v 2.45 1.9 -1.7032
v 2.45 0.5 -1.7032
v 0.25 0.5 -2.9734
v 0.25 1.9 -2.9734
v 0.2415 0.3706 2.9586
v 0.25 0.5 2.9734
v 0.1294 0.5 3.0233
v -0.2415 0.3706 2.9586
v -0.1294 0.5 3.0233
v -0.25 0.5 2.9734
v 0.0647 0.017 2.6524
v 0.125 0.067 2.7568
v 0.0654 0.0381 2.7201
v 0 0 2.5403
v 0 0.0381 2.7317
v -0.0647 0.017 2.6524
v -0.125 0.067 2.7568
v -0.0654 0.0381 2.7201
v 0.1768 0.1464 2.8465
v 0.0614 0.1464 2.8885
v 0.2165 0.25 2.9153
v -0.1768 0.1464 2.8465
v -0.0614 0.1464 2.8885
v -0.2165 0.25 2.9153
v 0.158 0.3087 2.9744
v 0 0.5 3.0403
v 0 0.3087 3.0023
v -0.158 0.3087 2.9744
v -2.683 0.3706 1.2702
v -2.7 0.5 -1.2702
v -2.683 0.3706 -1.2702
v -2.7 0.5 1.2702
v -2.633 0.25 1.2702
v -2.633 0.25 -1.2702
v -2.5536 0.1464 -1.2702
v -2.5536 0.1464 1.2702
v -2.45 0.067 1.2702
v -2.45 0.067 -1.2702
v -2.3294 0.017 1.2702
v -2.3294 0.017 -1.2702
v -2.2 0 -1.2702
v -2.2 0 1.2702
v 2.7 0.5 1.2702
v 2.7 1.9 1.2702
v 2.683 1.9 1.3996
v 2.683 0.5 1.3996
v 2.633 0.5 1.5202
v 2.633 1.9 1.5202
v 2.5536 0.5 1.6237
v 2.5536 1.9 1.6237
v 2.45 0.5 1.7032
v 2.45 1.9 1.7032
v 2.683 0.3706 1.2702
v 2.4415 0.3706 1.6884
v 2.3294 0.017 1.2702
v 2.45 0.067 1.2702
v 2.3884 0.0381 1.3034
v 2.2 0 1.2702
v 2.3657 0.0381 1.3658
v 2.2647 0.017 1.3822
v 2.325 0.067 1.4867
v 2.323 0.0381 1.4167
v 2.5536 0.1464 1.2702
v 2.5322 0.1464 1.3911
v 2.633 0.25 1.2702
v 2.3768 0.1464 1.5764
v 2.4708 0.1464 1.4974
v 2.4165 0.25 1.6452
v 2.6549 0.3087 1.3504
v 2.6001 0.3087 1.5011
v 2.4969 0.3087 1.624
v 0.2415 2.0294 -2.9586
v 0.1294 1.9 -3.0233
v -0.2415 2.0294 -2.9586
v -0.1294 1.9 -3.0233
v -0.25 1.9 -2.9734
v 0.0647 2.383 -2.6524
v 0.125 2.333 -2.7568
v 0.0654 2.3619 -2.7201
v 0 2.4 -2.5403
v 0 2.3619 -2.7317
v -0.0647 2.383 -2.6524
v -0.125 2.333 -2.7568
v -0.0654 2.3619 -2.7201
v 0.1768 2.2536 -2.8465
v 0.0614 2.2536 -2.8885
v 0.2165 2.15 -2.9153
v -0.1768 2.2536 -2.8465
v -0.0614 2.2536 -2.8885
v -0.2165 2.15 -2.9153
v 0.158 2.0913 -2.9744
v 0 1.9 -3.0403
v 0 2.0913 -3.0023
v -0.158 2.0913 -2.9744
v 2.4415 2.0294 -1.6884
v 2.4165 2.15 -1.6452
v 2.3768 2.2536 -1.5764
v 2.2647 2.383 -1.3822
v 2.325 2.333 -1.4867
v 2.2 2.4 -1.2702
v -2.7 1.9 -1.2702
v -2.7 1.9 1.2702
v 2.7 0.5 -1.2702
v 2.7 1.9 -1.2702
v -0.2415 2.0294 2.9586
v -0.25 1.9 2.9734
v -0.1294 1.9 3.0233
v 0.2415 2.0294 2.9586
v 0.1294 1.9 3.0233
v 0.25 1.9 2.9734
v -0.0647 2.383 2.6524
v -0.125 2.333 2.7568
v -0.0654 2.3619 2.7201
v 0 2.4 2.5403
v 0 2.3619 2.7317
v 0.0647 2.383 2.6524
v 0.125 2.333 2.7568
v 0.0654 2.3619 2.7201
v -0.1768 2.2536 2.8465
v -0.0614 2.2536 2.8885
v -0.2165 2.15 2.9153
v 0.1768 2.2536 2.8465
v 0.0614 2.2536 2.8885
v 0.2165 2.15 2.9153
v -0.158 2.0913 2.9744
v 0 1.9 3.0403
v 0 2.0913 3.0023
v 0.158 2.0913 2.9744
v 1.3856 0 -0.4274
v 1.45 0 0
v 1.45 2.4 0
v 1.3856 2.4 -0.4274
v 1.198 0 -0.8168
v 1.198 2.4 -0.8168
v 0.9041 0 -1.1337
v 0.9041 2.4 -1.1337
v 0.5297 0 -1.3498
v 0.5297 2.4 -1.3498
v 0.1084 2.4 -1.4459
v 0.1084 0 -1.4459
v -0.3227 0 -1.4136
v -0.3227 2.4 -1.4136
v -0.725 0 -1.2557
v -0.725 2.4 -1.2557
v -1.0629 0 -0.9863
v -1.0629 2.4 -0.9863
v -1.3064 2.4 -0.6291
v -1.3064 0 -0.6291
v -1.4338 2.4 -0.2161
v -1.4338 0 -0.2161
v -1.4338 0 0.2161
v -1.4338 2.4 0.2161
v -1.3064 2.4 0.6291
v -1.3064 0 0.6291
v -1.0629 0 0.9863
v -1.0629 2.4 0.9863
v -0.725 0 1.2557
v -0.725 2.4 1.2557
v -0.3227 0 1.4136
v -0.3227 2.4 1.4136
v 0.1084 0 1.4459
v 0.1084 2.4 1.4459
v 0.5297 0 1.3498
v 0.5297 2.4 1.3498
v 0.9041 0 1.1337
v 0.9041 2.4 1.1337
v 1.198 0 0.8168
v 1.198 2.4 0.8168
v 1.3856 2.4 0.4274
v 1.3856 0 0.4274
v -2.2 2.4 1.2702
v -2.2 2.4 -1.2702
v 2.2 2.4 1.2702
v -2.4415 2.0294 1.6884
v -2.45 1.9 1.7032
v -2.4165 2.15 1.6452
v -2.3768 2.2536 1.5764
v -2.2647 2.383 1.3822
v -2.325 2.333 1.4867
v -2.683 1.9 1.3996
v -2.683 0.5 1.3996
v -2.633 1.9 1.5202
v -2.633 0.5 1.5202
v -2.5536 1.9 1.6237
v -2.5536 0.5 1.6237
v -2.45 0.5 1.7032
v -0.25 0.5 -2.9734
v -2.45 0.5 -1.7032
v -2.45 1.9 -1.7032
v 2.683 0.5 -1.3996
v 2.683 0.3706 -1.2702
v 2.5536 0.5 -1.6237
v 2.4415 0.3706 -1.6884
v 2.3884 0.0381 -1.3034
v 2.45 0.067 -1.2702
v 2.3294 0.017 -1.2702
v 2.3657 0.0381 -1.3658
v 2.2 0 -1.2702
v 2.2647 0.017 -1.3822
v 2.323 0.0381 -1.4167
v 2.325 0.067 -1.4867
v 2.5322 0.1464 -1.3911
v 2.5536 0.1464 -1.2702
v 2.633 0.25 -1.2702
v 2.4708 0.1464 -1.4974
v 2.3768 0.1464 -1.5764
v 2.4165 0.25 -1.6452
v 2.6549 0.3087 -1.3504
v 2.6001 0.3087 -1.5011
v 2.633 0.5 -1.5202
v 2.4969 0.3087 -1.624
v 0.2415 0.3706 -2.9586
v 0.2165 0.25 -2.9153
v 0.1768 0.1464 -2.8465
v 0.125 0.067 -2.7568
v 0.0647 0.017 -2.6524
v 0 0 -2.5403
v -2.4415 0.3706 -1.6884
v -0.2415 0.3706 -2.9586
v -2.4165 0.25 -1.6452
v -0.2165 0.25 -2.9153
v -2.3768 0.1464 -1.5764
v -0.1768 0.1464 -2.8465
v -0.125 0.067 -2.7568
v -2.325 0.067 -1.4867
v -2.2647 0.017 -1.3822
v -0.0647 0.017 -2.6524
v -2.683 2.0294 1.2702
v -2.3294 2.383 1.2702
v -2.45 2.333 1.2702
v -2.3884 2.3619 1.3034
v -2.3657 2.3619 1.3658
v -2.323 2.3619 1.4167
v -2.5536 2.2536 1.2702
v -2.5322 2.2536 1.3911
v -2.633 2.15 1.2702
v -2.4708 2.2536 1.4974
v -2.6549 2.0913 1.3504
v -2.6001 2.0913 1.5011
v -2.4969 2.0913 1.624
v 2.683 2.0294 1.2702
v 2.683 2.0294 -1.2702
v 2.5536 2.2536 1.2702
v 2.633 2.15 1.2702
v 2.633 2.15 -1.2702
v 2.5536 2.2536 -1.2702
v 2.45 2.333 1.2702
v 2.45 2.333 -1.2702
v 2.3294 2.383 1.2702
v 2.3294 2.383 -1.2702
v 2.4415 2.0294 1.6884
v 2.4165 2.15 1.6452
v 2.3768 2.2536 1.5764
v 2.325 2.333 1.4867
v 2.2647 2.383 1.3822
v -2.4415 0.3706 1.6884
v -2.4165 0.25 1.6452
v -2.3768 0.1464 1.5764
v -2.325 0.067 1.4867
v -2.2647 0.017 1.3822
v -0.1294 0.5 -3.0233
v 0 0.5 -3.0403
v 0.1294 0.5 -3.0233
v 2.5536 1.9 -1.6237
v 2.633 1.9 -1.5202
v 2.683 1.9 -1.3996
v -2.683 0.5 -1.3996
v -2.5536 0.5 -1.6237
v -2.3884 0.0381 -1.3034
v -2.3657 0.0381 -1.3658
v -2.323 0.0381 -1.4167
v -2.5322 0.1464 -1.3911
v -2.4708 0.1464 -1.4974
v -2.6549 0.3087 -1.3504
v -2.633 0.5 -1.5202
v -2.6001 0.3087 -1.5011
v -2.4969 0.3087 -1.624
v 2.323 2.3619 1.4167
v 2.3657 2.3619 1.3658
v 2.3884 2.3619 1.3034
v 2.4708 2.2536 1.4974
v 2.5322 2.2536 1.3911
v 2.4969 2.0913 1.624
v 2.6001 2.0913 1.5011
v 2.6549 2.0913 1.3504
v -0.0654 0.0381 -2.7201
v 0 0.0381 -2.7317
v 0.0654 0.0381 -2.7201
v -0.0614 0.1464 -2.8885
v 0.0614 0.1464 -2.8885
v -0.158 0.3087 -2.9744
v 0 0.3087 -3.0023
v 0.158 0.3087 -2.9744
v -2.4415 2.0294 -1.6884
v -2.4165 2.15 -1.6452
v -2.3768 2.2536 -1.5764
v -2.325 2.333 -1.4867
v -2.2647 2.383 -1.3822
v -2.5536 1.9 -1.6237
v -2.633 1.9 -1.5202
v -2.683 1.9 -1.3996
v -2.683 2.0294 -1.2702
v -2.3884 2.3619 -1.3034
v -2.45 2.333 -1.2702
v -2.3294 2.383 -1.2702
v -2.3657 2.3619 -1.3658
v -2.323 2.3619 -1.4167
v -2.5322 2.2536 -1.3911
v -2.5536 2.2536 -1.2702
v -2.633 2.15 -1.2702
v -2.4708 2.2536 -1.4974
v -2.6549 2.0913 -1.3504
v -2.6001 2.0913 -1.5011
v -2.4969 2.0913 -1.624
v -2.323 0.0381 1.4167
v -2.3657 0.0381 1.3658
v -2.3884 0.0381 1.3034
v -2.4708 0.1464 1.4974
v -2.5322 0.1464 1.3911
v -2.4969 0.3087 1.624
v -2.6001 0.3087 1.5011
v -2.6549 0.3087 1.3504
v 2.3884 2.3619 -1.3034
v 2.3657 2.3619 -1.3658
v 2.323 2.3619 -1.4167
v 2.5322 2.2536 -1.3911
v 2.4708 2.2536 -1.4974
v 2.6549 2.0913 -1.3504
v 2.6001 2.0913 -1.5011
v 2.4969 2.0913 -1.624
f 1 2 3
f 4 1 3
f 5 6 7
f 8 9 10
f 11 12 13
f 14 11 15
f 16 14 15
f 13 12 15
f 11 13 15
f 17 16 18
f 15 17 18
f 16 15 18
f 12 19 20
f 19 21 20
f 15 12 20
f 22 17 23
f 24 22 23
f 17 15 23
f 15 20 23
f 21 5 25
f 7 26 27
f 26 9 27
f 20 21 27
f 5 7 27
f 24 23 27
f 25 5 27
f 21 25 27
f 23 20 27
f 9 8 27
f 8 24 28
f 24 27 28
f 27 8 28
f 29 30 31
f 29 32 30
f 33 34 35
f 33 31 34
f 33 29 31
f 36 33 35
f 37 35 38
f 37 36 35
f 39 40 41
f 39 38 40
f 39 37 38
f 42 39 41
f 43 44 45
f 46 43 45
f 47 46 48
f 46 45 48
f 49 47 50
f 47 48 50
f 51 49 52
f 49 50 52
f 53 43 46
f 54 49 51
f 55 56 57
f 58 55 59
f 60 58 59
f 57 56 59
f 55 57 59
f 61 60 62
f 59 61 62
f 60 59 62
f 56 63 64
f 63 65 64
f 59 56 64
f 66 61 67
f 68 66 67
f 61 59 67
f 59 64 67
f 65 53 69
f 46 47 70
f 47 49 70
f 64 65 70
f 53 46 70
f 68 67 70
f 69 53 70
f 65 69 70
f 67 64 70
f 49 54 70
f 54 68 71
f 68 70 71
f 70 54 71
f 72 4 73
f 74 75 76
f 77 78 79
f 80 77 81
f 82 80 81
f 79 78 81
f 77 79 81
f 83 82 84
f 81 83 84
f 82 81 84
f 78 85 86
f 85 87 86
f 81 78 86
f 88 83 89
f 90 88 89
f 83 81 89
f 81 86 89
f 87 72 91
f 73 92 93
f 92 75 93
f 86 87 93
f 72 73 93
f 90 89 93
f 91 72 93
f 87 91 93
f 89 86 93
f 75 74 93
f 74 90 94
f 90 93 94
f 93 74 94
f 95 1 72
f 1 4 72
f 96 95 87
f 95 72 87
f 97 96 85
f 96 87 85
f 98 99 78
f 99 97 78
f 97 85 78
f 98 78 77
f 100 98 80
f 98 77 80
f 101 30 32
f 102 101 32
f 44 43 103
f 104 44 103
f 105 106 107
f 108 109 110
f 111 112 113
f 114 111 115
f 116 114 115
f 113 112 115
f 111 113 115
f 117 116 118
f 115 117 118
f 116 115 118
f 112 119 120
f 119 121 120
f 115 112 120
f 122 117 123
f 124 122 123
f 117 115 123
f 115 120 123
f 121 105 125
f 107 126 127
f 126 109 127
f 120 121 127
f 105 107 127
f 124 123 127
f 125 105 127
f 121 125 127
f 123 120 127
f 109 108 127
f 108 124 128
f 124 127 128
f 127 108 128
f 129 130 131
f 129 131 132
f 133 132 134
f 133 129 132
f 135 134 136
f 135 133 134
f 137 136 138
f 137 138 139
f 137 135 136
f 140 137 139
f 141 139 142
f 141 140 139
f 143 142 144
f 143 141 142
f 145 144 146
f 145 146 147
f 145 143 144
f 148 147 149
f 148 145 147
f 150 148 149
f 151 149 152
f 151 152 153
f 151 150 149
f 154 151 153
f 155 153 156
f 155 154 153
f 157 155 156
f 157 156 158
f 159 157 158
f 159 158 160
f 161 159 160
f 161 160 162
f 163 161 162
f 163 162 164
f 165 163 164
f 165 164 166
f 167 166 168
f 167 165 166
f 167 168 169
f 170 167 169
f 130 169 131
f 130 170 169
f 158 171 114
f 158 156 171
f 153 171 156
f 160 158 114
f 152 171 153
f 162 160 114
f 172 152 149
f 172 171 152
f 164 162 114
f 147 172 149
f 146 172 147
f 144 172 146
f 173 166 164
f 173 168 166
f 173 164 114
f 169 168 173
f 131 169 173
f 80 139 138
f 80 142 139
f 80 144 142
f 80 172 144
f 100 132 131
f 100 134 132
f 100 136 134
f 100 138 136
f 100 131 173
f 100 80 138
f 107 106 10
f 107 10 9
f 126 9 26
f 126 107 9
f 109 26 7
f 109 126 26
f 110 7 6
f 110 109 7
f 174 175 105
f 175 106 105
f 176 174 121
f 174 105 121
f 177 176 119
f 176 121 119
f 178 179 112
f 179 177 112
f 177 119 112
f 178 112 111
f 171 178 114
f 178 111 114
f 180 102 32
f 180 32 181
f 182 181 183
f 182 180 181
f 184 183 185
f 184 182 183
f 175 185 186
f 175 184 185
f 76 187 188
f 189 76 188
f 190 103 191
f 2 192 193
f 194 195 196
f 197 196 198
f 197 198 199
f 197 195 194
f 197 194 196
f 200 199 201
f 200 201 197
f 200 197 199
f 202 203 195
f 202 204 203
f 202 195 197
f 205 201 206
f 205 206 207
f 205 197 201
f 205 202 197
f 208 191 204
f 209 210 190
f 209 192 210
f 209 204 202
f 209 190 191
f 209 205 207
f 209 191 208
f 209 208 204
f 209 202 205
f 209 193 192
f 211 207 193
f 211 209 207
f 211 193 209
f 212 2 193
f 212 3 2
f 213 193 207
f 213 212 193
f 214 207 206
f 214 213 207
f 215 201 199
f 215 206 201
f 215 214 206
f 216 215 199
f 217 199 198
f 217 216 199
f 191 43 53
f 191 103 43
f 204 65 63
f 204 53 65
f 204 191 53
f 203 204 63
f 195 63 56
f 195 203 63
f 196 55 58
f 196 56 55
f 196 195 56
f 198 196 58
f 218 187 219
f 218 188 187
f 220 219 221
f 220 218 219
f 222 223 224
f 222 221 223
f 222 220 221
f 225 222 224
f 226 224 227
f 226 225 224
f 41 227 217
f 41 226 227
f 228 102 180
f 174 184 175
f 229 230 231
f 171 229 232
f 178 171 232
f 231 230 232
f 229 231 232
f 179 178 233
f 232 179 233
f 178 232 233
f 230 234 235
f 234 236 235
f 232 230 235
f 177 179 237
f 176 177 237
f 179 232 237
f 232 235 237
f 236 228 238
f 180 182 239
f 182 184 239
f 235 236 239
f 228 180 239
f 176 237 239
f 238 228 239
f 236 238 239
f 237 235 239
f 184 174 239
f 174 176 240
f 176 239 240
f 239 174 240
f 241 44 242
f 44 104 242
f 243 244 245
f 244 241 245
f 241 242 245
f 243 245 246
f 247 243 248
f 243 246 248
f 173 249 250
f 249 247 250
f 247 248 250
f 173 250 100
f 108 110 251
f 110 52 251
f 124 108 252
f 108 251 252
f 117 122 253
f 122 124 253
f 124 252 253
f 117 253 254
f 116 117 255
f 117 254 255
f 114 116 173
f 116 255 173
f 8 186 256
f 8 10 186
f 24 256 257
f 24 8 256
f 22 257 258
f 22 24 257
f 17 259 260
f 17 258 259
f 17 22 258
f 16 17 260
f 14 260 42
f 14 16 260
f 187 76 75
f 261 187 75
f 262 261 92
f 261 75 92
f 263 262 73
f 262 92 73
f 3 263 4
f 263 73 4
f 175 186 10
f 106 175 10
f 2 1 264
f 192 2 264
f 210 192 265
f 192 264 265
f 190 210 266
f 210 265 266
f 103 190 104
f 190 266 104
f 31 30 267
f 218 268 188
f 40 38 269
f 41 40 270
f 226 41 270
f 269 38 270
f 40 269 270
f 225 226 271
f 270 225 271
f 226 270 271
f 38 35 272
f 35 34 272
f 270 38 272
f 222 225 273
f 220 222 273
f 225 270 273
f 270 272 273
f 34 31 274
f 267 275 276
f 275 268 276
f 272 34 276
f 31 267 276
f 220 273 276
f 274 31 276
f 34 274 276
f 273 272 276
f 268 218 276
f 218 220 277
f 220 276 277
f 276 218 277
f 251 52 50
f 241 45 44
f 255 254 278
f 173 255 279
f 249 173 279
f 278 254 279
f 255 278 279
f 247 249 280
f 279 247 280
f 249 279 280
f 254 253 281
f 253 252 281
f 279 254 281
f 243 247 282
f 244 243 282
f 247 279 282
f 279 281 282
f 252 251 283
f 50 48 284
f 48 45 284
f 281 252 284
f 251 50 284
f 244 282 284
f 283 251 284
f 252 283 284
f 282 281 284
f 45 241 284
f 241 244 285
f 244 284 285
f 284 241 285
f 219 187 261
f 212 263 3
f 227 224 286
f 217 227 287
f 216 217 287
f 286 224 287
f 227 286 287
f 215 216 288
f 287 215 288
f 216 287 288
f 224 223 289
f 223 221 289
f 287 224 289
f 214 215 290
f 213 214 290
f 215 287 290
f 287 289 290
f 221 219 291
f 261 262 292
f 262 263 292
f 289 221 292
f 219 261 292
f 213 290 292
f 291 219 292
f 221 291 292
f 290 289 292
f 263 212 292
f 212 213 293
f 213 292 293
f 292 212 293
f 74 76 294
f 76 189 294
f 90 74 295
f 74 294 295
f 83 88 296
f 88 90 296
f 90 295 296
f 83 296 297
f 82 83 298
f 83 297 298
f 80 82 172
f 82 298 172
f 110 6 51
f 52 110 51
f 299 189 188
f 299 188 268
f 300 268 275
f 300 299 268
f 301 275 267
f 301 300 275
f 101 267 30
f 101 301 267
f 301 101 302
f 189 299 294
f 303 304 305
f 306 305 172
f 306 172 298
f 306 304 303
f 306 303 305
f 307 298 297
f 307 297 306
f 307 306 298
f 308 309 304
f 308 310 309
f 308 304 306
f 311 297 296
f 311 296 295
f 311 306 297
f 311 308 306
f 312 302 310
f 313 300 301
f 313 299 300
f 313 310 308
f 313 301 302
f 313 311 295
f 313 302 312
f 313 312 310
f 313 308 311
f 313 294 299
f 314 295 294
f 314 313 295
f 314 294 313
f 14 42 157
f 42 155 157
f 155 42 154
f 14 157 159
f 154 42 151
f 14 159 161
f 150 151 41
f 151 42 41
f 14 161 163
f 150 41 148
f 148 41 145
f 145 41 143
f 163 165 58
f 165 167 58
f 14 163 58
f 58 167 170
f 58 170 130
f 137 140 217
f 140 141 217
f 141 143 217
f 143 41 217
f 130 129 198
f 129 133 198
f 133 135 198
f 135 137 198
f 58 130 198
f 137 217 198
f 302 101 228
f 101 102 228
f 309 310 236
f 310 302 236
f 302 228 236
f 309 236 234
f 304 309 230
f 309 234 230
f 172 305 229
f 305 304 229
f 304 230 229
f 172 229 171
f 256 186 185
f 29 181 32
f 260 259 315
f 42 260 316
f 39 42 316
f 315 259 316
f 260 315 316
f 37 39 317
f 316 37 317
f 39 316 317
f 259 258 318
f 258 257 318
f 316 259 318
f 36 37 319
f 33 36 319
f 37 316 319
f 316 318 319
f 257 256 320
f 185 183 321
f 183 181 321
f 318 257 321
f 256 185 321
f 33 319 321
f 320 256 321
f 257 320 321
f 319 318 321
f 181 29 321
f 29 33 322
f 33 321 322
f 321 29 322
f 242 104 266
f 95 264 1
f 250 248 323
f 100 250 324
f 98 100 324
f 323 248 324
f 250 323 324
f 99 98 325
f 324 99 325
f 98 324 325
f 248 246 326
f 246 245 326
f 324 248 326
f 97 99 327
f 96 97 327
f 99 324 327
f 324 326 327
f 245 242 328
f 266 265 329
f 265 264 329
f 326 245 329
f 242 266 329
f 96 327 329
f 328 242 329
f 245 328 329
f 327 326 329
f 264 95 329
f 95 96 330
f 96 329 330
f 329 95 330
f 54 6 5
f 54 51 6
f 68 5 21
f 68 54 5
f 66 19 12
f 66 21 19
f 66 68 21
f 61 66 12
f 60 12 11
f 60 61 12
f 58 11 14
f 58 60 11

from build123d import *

# Parameters (mm, degrees)
SKETCH1_R           = 1.45
BOSS_EXTRUDE1_DEPTH = 2.4
FILLET1_R           = 0.5


with BuildPart() as part:
    # Sketch1 → Boss-Extrude1 (new body)
    with BuildSketch(Plane(origin=(0, 0, 0), x_dir=(1, 0, 0), z_dir=(0, 1, 0))):
        Polygon((0, 3.117691454), (-2.7, 1.558845727), (-2.7, -1.558845727), (0, -3.117691454), (2.7, -1.558845727), (2.7, 1.558845727), align=None)
        Circle(SKETCH1_R, mode=Mode.SUBTRACT)
    extrude(amount=BOSS_EXTRUDE1_DEPTH)

    # Fillet1
    fillet1_edges = [part.edges().sort_by_distance(p)[0] for p in [
        (2.7, 1.2, -1.558845727),
        (2.7, 1.2, 1.558845727),
        (0, 1.2, 3.117691454),
        (-2.7, 1.2, 1.558845727),
        (-2.7, 1.2, -1.558845727),
        (0, 1.2, -3.117691454),
        (-2.7, 2.4, 0),
        (-1.35, 2.4, 2.33826859),
        (1.35, 2.4, 2.33826859),
        (2.7, 2.4, 0),
        (1.35, 2.4, -2.33826859),
        (2.7, 0, 0),
        (1.35, 0, 2.33826859),
        (-1.35, 0, 2.33826859),
        (-2.7, 0, 0),
        (-1.35, 0, -2.33826859),
        (1.35, 0, -2.33826859),
        (-1.35, 2.4, -2.33826859),
    ]]
    fillet(fillet1_edges, radius=FILLET1_R)


solid = part.part
